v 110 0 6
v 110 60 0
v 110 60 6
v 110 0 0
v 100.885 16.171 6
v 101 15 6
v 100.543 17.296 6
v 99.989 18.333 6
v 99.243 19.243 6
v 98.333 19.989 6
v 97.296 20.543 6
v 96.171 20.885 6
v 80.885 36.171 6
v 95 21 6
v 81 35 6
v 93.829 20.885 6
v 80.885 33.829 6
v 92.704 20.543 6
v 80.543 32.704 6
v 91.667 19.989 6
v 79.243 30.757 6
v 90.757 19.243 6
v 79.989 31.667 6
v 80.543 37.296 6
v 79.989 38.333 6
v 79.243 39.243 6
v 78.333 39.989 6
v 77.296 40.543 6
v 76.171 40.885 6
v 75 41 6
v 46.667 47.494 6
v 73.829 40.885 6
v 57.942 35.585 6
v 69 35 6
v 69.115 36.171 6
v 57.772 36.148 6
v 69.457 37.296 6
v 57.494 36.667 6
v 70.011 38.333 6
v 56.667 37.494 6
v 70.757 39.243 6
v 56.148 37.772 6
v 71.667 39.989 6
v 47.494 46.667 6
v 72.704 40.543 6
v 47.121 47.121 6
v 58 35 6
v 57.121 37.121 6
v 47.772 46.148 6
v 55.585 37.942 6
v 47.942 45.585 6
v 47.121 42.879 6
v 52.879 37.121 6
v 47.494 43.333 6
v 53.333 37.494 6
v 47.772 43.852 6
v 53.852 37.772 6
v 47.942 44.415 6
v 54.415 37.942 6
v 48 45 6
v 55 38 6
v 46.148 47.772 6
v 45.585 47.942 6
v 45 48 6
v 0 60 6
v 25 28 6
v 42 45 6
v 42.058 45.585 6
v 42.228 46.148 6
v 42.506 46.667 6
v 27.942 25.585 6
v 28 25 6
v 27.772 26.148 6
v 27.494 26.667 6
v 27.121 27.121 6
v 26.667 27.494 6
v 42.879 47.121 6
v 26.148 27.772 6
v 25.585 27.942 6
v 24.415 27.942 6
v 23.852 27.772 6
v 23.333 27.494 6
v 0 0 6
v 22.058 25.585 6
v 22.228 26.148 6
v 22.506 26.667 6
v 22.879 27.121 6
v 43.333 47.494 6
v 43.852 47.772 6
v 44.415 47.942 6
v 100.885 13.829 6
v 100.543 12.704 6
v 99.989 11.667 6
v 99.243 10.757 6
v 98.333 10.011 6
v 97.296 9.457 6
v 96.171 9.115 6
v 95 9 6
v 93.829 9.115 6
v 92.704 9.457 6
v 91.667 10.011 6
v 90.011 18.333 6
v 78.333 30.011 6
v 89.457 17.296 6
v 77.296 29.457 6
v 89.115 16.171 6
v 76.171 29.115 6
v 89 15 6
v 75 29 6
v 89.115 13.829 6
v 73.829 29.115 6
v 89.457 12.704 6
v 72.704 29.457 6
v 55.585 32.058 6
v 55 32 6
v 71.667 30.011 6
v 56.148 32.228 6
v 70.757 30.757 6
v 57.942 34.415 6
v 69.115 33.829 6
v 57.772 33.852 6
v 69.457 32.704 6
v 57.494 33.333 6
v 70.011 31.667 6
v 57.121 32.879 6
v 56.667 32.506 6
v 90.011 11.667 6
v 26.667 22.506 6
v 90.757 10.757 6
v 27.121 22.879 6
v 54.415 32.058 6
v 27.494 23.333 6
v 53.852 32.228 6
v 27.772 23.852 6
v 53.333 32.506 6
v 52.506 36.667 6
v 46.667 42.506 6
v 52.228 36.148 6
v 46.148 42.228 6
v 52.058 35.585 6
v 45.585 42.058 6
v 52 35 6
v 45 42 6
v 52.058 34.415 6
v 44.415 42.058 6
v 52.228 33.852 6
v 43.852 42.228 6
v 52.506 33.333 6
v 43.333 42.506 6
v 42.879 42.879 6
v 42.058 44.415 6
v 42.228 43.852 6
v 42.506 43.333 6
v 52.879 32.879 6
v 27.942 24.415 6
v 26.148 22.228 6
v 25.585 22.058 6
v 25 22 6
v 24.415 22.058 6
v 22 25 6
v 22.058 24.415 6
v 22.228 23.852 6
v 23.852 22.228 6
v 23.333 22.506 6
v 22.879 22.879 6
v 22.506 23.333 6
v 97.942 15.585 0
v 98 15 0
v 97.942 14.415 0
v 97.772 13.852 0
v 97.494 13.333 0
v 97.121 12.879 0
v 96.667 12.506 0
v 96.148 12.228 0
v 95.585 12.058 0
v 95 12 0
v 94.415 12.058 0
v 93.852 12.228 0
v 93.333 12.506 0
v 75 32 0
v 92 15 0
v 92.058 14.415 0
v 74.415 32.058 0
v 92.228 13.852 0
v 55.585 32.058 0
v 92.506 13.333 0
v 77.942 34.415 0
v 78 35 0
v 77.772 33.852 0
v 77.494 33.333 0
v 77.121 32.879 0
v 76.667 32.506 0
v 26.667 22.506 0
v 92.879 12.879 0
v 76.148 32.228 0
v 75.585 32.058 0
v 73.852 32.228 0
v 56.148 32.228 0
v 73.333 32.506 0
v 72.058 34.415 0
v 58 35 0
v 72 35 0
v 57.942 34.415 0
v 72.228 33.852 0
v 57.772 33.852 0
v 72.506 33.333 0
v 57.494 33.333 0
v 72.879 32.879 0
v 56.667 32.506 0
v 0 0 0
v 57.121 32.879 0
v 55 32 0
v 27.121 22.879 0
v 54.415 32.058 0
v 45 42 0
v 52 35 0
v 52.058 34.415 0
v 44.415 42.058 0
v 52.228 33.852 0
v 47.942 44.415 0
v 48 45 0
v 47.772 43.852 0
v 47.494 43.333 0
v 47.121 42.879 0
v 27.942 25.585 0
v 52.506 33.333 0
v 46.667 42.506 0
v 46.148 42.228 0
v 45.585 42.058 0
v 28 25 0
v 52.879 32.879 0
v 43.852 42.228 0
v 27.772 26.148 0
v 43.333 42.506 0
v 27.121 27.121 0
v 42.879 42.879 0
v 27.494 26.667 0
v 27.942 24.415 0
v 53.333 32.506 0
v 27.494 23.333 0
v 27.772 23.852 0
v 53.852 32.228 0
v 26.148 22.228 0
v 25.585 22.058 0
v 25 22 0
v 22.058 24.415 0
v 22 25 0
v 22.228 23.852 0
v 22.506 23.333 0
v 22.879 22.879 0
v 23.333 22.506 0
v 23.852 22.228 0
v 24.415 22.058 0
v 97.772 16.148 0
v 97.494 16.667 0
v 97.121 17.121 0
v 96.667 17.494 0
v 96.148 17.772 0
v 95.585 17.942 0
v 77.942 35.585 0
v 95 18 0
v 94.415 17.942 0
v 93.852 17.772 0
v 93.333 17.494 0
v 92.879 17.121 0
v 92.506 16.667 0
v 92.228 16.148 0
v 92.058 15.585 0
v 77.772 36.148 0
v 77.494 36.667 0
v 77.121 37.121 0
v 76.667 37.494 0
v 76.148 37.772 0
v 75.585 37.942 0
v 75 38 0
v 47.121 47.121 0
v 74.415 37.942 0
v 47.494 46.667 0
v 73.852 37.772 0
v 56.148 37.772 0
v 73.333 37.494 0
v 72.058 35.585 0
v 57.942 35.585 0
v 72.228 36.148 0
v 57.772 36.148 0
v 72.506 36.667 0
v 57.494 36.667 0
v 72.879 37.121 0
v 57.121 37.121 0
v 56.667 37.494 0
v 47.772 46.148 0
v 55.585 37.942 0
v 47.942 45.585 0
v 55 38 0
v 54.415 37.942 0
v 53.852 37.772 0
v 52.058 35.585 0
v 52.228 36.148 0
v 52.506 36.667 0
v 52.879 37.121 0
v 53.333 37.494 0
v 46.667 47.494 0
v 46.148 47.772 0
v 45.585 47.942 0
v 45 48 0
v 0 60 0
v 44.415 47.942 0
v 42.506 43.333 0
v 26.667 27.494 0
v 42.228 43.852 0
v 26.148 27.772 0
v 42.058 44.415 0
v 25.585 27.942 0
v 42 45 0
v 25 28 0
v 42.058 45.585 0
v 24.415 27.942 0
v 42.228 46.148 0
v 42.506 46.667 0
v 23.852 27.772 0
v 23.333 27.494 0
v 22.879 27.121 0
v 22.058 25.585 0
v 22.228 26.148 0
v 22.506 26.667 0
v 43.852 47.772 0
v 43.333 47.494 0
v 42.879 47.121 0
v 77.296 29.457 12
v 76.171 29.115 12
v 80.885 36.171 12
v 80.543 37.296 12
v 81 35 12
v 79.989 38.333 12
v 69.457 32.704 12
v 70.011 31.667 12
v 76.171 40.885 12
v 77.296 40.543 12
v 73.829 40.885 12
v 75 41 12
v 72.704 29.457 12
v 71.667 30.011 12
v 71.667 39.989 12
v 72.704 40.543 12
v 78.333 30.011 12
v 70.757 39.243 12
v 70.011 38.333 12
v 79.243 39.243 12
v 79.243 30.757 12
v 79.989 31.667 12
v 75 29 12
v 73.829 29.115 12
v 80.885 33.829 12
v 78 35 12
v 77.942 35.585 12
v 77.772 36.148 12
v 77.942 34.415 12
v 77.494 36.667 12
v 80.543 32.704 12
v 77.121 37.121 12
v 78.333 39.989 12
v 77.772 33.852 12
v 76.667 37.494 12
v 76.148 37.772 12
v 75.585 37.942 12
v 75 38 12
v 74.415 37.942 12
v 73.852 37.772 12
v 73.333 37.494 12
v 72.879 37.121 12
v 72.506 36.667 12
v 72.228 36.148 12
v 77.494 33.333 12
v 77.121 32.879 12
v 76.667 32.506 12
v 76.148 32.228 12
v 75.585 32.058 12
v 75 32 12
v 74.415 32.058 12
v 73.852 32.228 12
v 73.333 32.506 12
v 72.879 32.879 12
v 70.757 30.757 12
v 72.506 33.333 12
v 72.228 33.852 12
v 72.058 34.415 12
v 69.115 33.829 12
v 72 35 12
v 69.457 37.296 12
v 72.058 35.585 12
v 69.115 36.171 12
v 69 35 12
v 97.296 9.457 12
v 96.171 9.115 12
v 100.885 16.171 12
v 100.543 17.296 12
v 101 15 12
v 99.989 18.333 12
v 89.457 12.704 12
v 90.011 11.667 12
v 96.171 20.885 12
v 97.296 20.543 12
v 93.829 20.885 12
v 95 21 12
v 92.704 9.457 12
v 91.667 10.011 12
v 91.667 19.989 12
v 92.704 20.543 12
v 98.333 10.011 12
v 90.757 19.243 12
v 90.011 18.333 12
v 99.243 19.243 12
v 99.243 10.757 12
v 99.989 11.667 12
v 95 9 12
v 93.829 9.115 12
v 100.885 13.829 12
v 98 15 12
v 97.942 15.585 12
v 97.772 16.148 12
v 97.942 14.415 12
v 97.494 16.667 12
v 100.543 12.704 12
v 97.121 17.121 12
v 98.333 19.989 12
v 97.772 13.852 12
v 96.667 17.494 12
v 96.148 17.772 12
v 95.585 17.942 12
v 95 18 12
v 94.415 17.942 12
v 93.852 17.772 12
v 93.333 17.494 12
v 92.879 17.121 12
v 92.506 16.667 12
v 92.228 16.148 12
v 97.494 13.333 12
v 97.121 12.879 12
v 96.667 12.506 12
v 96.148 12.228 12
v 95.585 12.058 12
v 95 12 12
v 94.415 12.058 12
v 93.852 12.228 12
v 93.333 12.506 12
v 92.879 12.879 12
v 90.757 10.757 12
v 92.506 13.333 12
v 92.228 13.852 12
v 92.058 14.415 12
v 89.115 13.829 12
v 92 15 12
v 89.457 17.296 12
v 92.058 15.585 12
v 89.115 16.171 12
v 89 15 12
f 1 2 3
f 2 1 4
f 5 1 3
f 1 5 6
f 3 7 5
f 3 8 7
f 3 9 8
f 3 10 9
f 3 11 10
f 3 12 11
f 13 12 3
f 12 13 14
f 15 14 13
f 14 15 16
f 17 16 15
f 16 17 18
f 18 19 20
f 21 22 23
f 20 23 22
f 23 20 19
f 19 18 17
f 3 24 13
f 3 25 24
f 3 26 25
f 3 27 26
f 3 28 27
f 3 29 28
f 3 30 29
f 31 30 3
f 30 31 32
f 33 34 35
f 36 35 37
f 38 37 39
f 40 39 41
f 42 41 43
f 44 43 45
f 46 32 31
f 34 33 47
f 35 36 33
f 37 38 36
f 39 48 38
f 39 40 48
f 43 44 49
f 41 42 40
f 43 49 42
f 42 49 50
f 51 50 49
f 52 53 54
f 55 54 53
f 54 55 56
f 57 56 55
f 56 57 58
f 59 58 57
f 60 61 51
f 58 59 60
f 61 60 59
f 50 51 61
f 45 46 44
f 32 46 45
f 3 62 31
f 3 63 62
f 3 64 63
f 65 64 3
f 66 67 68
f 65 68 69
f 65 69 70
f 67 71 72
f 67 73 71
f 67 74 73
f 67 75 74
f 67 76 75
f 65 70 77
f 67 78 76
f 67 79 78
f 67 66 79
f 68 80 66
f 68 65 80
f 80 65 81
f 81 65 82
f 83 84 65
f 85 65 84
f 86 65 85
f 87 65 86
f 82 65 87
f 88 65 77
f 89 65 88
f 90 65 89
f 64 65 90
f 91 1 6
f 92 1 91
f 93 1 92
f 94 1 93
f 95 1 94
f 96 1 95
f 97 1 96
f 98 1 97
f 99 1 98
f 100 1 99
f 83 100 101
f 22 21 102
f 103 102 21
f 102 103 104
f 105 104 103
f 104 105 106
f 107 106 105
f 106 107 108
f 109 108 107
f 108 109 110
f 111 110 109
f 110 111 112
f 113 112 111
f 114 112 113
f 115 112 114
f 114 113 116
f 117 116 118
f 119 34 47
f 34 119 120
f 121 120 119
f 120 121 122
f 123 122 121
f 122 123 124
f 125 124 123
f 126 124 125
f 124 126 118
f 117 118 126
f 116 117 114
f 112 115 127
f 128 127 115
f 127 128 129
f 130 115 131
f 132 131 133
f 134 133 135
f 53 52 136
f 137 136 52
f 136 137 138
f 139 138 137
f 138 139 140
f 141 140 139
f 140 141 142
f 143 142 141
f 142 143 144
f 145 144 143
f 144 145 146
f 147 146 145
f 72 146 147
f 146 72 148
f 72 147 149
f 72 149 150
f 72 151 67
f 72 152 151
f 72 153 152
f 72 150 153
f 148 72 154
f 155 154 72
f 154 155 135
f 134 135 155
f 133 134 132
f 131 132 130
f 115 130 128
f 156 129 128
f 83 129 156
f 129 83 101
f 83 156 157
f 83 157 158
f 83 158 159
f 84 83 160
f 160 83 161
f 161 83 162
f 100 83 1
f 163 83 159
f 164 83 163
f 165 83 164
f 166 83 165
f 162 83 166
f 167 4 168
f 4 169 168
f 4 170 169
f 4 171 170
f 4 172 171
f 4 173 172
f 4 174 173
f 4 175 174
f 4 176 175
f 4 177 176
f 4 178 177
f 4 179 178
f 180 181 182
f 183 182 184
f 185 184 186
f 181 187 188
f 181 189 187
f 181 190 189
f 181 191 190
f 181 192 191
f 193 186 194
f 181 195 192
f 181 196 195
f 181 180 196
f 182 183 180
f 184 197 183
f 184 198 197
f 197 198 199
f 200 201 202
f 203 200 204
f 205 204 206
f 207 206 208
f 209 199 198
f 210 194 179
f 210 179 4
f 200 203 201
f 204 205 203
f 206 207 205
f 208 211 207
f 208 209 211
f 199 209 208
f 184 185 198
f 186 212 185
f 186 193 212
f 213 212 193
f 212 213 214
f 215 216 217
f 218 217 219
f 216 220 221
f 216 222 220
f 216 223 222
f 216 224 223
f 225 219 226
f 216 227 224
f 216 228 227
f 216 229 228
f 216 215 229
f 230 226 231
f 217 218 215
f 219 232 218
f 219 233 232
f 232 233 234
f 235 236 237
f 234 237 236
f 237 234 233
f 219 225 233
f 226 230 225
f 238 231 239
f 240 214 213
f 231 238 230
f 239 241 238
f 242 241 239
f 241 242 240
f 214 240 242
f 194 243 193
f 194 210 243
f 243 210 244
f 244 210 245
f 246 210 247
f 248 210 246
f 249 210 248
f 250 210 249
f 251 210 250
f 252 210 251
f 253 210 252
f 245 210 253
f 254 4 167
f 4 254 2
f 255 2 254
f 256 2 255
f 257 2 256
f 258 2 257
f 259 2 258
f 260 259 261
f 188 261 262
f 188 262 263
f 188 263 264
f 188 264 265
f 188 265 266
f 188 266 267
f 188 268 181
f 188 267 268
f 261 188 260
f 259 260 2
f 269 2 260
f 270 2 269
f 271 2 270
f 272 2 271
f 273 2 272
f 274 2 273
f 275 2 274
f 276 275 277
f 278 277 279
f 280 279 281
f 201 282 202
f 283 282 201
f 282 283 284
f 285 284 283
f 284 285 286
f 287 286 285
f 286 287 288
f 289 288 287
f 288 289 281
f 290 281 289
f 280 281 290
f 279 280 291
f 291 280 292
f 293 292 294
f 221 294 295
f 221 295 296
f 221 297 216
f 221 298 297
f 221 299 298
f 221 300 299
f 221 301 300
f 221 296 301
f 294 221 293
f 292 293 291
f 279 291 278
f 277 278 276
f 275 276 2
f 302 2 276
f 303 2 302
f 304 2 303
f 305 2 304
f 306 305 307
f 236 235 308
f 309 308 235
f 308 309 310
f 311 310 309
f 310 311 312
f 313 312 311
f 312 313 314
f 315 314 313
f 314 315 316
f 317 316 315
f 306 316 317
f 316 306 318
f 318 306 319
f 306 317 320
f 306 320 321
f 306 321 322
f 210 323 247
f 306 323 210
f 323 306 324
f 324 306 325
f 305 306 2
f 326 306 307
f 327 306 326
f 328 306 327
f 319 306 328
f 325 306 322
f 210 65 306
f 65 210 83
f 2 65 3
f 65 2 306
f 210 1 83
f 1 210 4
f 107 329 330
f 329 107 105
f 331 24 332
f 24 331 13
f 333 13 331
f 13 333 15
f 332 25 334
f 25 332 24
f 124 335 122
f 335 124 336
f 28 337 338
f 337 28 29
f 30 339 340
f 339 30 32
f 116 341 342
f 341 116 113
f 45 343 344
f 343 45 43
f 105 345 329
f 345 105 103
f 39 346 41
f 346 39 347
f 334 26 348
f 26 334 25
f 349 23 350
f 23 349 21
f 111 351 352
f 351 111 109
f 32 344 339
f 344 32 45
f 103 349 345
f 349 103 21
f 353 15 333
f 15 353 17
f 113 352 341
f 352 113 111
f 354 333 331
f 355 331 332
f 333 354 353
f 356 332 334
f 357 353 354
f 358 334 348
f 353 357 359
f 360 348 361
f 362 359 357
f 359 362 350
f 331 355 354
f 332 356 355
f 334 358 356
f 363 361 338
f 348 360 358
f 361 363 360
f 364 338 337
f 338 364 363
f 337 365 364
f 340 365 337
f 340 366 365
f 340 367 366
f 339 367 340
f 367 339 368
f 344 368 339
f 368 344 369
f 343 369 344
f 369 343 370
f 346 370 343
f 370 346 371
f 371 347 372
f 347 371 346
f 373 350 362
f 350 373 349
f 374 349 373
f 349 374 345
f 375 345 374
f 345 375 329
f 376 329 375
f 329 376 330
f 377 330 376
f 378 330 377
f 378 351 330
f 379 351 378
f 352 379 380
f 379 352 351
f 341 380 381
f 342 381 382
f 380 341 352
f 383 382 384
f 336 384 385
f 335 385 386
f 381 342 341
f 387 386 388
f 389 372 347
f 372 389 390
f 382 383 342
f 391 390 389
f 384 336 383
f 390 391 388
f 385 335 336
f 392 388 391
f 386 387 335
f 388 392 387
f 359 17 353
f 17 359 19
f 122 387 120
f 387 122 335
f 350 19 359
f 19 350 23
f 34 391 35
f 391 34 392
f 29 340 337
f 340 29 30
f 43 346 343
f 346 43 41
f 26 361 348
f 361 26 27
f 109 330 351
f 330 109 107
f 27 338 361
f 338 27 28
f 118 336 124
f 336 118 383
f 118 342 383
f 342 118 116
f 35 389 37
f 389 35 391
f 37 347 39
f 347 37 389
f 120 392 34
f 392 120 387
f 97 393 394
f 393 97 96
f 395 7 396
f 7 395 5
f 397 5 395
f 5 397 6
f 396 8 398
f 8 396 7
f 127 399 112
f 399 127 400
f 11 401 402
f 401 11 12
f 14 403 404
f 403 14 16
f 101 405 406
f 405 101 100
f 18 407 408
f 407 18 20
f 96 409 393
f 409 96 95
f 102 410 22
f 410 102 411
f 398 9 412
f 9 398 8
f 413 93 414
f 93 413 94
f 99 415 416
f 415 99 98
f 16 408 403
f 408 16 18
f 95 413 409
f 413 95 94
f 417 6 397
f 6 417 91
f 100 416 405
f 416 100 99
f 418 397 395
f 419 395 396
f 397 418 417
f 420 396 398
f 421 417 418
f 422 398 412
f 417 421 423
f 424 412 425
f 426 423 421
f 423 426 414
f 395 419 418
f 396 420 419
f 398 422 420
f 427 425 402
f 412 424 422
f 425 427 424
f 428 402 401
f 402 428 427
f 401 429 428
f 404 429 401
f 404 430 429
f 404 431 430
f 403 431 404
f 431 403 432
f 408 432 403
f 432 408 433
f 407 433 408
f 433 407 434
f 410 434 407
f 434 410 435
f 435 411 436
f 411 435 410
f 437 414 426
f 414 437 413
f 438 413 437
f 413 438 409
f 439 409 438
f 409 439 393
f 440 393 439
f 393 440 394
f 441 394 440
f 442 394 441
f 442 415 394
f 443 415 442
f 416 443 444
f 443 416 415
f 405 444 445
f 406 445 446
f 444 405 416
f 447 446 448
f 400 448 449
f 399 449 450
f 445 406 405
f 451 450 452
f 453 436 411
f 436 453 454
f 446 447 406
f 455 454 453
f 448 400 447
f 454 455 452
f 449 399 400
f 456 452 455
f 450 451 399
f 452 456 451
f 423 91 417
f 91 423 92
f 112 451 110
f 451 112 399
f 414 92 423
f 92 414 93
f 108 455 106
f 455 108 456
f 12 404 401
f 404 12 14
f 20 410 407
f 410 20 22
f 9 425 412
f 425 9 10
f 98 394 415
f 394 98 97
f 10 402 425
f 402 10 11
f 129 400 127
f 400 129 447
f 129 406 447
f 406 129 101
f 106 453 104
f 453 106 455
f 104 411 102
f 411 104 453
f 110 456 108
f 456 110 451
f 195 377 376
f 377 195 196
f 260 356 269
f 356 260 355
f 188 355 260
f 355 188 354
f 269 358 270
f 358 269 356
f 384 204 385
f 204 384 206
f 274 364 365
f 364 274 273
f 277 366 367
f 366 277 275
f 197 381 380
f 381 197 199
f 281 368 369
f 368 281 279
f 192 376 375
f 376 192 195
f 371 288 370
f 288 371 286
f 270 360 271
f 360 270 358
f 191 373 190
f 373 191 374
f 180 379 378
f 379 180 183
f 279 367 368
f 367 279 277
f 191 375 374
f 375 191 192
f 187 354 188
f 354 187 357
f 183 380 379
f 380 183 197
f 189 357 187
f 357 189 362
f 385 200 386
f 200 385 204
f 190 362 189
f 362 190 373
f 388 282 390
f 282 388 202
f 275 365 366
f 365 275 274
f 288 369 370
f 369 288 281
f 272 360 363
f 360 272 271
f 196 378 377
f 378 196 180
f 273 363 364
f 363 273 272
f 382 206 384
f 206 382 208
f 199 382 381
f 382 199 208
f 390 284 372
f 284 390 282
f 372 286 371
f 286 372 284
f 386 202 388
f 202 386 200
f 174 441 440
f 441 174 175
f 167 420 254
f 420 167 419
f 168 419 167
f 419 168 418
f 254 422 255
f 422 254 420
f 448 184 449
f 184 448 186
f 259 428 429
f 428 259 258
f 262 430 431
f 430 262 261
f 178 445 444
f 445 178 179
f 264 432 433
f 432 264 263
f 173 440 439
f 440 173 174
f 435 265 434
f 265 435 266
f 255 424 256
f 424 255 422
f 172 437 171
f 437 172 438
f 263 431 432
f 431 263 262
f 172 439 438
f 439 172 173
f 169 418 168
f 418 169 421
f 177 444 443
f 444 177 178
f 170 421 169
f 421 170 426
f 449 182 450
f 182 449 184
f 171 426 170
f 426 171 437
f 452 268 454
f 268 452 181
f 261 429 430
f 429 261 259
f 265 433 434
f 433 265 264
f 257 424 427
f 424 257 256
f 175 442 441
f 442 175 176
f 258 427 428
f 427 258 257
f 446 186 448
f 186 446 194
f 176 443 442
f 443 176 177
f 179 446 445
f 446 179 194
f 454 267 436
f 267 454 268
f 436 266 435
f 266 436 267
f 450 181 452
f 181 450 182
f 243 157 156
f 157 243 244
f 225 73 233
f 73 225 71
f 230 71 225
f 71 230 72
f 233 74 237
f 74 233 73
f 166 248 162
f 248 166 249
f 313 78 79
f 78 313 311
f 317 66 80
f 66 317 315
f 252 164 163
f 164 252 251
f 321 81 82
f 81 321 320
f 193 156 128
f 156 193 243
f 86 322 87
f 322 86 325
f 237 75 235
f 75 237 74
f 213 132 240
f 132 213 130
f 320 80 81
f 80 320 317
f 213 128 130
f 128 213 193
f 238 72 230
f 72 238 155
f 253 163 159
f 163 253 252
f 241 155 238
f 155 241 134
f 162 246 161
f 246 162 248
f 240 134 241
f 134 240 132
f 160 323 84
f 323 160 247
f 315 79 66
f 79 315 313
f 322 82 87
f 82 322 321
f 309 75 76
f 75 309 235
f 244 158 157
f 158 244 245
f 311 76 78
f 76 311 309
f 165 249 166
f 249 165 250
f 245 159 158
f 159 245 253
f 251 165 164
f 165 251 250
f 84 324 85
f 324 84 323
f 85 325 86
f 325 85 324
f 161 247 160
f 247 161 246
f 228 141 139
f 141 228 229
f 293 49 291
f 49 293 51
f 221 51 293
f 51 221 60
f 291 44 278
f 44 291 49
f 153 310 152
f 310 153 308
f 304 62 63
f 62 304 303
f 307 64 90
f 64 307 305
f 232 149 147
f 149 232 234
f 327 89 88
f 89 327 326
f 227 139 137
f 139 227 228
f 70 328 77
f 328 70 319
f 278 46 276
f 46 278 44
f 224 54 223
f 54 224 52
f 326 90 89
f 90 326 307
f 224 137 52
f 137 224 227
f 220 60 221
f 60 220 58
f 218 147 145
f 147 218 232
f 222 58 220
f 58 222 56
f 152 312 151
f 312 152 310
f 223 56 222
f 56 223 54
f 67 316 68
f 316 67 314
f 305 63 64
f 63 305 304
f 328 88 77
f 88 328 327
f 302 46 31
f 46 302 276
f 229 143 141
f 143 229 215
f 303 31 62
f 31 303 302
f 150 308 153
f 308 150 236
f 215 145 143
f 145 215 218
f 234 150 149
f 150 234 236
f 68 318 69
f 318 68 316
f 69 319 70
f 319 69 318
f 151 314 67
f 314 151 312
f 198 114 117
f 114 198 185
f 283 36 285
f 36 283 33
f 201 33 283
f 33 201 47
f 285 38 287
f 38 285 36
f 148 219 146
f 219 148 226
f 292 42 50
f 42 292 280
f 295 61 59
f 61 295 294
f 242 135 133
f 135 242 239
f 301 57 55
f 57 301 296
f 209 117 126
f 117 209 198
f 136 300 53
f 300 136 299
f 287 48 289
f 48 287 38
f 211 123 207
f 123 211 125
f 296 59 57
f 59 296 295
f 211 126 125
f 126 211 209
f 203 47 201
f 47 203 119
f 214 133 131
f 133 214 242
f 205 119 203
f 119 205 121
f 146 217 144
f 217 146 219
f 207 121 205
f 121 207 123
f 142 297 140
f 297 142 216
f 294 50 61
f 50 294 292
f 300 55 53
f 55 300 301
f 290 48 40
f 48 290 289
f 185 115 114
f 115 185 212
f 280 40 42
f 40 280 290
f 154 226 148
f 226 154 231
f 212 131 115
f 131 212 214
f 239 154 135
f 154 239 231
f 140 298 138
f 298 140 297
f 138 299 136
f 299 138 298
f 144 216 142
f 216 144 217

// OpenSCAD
$fn = 32;

// ----------------------------------------------------------------------
// Mixed field: bosses and holes at given coordinates
// ----------------------------------------------------------------------

// --- parameters (mm) ---
plate_l = 110;            // plate length, X
plate_w = 60;             // plate width, Y
plate_t = 6;              // plate thickness, Z
boss_d = 12;              // boss diameter
boss_h = 6;               // boss height above the plate
hole_d = 6;               // through hole diameter

total_h = plate_t + boss_h;  // overall height

difference() {
  union() {
    cube([plate_l, plate_w, plate_t]);
    translate([75, 35, plate_t]) cylinder(h = boss_h, d = boss_d);
    translate([95, 15, plate_t]) cylinder(h = boss_h, d = boss_d);
  }
  translate([75, 35, -1]) cylinder(h = total_h + 2, d = boss_d / 2);
  translate([95, 15, -1]) cylinder(h = total_h + 2, d = boss_d / 2);
  translate([25, 25, -1]) cylinder(h = plate_t + 2, d = hole_d);
  translate([45, 45, -1]) cylinder(h = plate_t + 2, d = hole_d);
  translate([55, 35, -1]) cylinder(h = plate_t + 2, d = hole_d);
}
